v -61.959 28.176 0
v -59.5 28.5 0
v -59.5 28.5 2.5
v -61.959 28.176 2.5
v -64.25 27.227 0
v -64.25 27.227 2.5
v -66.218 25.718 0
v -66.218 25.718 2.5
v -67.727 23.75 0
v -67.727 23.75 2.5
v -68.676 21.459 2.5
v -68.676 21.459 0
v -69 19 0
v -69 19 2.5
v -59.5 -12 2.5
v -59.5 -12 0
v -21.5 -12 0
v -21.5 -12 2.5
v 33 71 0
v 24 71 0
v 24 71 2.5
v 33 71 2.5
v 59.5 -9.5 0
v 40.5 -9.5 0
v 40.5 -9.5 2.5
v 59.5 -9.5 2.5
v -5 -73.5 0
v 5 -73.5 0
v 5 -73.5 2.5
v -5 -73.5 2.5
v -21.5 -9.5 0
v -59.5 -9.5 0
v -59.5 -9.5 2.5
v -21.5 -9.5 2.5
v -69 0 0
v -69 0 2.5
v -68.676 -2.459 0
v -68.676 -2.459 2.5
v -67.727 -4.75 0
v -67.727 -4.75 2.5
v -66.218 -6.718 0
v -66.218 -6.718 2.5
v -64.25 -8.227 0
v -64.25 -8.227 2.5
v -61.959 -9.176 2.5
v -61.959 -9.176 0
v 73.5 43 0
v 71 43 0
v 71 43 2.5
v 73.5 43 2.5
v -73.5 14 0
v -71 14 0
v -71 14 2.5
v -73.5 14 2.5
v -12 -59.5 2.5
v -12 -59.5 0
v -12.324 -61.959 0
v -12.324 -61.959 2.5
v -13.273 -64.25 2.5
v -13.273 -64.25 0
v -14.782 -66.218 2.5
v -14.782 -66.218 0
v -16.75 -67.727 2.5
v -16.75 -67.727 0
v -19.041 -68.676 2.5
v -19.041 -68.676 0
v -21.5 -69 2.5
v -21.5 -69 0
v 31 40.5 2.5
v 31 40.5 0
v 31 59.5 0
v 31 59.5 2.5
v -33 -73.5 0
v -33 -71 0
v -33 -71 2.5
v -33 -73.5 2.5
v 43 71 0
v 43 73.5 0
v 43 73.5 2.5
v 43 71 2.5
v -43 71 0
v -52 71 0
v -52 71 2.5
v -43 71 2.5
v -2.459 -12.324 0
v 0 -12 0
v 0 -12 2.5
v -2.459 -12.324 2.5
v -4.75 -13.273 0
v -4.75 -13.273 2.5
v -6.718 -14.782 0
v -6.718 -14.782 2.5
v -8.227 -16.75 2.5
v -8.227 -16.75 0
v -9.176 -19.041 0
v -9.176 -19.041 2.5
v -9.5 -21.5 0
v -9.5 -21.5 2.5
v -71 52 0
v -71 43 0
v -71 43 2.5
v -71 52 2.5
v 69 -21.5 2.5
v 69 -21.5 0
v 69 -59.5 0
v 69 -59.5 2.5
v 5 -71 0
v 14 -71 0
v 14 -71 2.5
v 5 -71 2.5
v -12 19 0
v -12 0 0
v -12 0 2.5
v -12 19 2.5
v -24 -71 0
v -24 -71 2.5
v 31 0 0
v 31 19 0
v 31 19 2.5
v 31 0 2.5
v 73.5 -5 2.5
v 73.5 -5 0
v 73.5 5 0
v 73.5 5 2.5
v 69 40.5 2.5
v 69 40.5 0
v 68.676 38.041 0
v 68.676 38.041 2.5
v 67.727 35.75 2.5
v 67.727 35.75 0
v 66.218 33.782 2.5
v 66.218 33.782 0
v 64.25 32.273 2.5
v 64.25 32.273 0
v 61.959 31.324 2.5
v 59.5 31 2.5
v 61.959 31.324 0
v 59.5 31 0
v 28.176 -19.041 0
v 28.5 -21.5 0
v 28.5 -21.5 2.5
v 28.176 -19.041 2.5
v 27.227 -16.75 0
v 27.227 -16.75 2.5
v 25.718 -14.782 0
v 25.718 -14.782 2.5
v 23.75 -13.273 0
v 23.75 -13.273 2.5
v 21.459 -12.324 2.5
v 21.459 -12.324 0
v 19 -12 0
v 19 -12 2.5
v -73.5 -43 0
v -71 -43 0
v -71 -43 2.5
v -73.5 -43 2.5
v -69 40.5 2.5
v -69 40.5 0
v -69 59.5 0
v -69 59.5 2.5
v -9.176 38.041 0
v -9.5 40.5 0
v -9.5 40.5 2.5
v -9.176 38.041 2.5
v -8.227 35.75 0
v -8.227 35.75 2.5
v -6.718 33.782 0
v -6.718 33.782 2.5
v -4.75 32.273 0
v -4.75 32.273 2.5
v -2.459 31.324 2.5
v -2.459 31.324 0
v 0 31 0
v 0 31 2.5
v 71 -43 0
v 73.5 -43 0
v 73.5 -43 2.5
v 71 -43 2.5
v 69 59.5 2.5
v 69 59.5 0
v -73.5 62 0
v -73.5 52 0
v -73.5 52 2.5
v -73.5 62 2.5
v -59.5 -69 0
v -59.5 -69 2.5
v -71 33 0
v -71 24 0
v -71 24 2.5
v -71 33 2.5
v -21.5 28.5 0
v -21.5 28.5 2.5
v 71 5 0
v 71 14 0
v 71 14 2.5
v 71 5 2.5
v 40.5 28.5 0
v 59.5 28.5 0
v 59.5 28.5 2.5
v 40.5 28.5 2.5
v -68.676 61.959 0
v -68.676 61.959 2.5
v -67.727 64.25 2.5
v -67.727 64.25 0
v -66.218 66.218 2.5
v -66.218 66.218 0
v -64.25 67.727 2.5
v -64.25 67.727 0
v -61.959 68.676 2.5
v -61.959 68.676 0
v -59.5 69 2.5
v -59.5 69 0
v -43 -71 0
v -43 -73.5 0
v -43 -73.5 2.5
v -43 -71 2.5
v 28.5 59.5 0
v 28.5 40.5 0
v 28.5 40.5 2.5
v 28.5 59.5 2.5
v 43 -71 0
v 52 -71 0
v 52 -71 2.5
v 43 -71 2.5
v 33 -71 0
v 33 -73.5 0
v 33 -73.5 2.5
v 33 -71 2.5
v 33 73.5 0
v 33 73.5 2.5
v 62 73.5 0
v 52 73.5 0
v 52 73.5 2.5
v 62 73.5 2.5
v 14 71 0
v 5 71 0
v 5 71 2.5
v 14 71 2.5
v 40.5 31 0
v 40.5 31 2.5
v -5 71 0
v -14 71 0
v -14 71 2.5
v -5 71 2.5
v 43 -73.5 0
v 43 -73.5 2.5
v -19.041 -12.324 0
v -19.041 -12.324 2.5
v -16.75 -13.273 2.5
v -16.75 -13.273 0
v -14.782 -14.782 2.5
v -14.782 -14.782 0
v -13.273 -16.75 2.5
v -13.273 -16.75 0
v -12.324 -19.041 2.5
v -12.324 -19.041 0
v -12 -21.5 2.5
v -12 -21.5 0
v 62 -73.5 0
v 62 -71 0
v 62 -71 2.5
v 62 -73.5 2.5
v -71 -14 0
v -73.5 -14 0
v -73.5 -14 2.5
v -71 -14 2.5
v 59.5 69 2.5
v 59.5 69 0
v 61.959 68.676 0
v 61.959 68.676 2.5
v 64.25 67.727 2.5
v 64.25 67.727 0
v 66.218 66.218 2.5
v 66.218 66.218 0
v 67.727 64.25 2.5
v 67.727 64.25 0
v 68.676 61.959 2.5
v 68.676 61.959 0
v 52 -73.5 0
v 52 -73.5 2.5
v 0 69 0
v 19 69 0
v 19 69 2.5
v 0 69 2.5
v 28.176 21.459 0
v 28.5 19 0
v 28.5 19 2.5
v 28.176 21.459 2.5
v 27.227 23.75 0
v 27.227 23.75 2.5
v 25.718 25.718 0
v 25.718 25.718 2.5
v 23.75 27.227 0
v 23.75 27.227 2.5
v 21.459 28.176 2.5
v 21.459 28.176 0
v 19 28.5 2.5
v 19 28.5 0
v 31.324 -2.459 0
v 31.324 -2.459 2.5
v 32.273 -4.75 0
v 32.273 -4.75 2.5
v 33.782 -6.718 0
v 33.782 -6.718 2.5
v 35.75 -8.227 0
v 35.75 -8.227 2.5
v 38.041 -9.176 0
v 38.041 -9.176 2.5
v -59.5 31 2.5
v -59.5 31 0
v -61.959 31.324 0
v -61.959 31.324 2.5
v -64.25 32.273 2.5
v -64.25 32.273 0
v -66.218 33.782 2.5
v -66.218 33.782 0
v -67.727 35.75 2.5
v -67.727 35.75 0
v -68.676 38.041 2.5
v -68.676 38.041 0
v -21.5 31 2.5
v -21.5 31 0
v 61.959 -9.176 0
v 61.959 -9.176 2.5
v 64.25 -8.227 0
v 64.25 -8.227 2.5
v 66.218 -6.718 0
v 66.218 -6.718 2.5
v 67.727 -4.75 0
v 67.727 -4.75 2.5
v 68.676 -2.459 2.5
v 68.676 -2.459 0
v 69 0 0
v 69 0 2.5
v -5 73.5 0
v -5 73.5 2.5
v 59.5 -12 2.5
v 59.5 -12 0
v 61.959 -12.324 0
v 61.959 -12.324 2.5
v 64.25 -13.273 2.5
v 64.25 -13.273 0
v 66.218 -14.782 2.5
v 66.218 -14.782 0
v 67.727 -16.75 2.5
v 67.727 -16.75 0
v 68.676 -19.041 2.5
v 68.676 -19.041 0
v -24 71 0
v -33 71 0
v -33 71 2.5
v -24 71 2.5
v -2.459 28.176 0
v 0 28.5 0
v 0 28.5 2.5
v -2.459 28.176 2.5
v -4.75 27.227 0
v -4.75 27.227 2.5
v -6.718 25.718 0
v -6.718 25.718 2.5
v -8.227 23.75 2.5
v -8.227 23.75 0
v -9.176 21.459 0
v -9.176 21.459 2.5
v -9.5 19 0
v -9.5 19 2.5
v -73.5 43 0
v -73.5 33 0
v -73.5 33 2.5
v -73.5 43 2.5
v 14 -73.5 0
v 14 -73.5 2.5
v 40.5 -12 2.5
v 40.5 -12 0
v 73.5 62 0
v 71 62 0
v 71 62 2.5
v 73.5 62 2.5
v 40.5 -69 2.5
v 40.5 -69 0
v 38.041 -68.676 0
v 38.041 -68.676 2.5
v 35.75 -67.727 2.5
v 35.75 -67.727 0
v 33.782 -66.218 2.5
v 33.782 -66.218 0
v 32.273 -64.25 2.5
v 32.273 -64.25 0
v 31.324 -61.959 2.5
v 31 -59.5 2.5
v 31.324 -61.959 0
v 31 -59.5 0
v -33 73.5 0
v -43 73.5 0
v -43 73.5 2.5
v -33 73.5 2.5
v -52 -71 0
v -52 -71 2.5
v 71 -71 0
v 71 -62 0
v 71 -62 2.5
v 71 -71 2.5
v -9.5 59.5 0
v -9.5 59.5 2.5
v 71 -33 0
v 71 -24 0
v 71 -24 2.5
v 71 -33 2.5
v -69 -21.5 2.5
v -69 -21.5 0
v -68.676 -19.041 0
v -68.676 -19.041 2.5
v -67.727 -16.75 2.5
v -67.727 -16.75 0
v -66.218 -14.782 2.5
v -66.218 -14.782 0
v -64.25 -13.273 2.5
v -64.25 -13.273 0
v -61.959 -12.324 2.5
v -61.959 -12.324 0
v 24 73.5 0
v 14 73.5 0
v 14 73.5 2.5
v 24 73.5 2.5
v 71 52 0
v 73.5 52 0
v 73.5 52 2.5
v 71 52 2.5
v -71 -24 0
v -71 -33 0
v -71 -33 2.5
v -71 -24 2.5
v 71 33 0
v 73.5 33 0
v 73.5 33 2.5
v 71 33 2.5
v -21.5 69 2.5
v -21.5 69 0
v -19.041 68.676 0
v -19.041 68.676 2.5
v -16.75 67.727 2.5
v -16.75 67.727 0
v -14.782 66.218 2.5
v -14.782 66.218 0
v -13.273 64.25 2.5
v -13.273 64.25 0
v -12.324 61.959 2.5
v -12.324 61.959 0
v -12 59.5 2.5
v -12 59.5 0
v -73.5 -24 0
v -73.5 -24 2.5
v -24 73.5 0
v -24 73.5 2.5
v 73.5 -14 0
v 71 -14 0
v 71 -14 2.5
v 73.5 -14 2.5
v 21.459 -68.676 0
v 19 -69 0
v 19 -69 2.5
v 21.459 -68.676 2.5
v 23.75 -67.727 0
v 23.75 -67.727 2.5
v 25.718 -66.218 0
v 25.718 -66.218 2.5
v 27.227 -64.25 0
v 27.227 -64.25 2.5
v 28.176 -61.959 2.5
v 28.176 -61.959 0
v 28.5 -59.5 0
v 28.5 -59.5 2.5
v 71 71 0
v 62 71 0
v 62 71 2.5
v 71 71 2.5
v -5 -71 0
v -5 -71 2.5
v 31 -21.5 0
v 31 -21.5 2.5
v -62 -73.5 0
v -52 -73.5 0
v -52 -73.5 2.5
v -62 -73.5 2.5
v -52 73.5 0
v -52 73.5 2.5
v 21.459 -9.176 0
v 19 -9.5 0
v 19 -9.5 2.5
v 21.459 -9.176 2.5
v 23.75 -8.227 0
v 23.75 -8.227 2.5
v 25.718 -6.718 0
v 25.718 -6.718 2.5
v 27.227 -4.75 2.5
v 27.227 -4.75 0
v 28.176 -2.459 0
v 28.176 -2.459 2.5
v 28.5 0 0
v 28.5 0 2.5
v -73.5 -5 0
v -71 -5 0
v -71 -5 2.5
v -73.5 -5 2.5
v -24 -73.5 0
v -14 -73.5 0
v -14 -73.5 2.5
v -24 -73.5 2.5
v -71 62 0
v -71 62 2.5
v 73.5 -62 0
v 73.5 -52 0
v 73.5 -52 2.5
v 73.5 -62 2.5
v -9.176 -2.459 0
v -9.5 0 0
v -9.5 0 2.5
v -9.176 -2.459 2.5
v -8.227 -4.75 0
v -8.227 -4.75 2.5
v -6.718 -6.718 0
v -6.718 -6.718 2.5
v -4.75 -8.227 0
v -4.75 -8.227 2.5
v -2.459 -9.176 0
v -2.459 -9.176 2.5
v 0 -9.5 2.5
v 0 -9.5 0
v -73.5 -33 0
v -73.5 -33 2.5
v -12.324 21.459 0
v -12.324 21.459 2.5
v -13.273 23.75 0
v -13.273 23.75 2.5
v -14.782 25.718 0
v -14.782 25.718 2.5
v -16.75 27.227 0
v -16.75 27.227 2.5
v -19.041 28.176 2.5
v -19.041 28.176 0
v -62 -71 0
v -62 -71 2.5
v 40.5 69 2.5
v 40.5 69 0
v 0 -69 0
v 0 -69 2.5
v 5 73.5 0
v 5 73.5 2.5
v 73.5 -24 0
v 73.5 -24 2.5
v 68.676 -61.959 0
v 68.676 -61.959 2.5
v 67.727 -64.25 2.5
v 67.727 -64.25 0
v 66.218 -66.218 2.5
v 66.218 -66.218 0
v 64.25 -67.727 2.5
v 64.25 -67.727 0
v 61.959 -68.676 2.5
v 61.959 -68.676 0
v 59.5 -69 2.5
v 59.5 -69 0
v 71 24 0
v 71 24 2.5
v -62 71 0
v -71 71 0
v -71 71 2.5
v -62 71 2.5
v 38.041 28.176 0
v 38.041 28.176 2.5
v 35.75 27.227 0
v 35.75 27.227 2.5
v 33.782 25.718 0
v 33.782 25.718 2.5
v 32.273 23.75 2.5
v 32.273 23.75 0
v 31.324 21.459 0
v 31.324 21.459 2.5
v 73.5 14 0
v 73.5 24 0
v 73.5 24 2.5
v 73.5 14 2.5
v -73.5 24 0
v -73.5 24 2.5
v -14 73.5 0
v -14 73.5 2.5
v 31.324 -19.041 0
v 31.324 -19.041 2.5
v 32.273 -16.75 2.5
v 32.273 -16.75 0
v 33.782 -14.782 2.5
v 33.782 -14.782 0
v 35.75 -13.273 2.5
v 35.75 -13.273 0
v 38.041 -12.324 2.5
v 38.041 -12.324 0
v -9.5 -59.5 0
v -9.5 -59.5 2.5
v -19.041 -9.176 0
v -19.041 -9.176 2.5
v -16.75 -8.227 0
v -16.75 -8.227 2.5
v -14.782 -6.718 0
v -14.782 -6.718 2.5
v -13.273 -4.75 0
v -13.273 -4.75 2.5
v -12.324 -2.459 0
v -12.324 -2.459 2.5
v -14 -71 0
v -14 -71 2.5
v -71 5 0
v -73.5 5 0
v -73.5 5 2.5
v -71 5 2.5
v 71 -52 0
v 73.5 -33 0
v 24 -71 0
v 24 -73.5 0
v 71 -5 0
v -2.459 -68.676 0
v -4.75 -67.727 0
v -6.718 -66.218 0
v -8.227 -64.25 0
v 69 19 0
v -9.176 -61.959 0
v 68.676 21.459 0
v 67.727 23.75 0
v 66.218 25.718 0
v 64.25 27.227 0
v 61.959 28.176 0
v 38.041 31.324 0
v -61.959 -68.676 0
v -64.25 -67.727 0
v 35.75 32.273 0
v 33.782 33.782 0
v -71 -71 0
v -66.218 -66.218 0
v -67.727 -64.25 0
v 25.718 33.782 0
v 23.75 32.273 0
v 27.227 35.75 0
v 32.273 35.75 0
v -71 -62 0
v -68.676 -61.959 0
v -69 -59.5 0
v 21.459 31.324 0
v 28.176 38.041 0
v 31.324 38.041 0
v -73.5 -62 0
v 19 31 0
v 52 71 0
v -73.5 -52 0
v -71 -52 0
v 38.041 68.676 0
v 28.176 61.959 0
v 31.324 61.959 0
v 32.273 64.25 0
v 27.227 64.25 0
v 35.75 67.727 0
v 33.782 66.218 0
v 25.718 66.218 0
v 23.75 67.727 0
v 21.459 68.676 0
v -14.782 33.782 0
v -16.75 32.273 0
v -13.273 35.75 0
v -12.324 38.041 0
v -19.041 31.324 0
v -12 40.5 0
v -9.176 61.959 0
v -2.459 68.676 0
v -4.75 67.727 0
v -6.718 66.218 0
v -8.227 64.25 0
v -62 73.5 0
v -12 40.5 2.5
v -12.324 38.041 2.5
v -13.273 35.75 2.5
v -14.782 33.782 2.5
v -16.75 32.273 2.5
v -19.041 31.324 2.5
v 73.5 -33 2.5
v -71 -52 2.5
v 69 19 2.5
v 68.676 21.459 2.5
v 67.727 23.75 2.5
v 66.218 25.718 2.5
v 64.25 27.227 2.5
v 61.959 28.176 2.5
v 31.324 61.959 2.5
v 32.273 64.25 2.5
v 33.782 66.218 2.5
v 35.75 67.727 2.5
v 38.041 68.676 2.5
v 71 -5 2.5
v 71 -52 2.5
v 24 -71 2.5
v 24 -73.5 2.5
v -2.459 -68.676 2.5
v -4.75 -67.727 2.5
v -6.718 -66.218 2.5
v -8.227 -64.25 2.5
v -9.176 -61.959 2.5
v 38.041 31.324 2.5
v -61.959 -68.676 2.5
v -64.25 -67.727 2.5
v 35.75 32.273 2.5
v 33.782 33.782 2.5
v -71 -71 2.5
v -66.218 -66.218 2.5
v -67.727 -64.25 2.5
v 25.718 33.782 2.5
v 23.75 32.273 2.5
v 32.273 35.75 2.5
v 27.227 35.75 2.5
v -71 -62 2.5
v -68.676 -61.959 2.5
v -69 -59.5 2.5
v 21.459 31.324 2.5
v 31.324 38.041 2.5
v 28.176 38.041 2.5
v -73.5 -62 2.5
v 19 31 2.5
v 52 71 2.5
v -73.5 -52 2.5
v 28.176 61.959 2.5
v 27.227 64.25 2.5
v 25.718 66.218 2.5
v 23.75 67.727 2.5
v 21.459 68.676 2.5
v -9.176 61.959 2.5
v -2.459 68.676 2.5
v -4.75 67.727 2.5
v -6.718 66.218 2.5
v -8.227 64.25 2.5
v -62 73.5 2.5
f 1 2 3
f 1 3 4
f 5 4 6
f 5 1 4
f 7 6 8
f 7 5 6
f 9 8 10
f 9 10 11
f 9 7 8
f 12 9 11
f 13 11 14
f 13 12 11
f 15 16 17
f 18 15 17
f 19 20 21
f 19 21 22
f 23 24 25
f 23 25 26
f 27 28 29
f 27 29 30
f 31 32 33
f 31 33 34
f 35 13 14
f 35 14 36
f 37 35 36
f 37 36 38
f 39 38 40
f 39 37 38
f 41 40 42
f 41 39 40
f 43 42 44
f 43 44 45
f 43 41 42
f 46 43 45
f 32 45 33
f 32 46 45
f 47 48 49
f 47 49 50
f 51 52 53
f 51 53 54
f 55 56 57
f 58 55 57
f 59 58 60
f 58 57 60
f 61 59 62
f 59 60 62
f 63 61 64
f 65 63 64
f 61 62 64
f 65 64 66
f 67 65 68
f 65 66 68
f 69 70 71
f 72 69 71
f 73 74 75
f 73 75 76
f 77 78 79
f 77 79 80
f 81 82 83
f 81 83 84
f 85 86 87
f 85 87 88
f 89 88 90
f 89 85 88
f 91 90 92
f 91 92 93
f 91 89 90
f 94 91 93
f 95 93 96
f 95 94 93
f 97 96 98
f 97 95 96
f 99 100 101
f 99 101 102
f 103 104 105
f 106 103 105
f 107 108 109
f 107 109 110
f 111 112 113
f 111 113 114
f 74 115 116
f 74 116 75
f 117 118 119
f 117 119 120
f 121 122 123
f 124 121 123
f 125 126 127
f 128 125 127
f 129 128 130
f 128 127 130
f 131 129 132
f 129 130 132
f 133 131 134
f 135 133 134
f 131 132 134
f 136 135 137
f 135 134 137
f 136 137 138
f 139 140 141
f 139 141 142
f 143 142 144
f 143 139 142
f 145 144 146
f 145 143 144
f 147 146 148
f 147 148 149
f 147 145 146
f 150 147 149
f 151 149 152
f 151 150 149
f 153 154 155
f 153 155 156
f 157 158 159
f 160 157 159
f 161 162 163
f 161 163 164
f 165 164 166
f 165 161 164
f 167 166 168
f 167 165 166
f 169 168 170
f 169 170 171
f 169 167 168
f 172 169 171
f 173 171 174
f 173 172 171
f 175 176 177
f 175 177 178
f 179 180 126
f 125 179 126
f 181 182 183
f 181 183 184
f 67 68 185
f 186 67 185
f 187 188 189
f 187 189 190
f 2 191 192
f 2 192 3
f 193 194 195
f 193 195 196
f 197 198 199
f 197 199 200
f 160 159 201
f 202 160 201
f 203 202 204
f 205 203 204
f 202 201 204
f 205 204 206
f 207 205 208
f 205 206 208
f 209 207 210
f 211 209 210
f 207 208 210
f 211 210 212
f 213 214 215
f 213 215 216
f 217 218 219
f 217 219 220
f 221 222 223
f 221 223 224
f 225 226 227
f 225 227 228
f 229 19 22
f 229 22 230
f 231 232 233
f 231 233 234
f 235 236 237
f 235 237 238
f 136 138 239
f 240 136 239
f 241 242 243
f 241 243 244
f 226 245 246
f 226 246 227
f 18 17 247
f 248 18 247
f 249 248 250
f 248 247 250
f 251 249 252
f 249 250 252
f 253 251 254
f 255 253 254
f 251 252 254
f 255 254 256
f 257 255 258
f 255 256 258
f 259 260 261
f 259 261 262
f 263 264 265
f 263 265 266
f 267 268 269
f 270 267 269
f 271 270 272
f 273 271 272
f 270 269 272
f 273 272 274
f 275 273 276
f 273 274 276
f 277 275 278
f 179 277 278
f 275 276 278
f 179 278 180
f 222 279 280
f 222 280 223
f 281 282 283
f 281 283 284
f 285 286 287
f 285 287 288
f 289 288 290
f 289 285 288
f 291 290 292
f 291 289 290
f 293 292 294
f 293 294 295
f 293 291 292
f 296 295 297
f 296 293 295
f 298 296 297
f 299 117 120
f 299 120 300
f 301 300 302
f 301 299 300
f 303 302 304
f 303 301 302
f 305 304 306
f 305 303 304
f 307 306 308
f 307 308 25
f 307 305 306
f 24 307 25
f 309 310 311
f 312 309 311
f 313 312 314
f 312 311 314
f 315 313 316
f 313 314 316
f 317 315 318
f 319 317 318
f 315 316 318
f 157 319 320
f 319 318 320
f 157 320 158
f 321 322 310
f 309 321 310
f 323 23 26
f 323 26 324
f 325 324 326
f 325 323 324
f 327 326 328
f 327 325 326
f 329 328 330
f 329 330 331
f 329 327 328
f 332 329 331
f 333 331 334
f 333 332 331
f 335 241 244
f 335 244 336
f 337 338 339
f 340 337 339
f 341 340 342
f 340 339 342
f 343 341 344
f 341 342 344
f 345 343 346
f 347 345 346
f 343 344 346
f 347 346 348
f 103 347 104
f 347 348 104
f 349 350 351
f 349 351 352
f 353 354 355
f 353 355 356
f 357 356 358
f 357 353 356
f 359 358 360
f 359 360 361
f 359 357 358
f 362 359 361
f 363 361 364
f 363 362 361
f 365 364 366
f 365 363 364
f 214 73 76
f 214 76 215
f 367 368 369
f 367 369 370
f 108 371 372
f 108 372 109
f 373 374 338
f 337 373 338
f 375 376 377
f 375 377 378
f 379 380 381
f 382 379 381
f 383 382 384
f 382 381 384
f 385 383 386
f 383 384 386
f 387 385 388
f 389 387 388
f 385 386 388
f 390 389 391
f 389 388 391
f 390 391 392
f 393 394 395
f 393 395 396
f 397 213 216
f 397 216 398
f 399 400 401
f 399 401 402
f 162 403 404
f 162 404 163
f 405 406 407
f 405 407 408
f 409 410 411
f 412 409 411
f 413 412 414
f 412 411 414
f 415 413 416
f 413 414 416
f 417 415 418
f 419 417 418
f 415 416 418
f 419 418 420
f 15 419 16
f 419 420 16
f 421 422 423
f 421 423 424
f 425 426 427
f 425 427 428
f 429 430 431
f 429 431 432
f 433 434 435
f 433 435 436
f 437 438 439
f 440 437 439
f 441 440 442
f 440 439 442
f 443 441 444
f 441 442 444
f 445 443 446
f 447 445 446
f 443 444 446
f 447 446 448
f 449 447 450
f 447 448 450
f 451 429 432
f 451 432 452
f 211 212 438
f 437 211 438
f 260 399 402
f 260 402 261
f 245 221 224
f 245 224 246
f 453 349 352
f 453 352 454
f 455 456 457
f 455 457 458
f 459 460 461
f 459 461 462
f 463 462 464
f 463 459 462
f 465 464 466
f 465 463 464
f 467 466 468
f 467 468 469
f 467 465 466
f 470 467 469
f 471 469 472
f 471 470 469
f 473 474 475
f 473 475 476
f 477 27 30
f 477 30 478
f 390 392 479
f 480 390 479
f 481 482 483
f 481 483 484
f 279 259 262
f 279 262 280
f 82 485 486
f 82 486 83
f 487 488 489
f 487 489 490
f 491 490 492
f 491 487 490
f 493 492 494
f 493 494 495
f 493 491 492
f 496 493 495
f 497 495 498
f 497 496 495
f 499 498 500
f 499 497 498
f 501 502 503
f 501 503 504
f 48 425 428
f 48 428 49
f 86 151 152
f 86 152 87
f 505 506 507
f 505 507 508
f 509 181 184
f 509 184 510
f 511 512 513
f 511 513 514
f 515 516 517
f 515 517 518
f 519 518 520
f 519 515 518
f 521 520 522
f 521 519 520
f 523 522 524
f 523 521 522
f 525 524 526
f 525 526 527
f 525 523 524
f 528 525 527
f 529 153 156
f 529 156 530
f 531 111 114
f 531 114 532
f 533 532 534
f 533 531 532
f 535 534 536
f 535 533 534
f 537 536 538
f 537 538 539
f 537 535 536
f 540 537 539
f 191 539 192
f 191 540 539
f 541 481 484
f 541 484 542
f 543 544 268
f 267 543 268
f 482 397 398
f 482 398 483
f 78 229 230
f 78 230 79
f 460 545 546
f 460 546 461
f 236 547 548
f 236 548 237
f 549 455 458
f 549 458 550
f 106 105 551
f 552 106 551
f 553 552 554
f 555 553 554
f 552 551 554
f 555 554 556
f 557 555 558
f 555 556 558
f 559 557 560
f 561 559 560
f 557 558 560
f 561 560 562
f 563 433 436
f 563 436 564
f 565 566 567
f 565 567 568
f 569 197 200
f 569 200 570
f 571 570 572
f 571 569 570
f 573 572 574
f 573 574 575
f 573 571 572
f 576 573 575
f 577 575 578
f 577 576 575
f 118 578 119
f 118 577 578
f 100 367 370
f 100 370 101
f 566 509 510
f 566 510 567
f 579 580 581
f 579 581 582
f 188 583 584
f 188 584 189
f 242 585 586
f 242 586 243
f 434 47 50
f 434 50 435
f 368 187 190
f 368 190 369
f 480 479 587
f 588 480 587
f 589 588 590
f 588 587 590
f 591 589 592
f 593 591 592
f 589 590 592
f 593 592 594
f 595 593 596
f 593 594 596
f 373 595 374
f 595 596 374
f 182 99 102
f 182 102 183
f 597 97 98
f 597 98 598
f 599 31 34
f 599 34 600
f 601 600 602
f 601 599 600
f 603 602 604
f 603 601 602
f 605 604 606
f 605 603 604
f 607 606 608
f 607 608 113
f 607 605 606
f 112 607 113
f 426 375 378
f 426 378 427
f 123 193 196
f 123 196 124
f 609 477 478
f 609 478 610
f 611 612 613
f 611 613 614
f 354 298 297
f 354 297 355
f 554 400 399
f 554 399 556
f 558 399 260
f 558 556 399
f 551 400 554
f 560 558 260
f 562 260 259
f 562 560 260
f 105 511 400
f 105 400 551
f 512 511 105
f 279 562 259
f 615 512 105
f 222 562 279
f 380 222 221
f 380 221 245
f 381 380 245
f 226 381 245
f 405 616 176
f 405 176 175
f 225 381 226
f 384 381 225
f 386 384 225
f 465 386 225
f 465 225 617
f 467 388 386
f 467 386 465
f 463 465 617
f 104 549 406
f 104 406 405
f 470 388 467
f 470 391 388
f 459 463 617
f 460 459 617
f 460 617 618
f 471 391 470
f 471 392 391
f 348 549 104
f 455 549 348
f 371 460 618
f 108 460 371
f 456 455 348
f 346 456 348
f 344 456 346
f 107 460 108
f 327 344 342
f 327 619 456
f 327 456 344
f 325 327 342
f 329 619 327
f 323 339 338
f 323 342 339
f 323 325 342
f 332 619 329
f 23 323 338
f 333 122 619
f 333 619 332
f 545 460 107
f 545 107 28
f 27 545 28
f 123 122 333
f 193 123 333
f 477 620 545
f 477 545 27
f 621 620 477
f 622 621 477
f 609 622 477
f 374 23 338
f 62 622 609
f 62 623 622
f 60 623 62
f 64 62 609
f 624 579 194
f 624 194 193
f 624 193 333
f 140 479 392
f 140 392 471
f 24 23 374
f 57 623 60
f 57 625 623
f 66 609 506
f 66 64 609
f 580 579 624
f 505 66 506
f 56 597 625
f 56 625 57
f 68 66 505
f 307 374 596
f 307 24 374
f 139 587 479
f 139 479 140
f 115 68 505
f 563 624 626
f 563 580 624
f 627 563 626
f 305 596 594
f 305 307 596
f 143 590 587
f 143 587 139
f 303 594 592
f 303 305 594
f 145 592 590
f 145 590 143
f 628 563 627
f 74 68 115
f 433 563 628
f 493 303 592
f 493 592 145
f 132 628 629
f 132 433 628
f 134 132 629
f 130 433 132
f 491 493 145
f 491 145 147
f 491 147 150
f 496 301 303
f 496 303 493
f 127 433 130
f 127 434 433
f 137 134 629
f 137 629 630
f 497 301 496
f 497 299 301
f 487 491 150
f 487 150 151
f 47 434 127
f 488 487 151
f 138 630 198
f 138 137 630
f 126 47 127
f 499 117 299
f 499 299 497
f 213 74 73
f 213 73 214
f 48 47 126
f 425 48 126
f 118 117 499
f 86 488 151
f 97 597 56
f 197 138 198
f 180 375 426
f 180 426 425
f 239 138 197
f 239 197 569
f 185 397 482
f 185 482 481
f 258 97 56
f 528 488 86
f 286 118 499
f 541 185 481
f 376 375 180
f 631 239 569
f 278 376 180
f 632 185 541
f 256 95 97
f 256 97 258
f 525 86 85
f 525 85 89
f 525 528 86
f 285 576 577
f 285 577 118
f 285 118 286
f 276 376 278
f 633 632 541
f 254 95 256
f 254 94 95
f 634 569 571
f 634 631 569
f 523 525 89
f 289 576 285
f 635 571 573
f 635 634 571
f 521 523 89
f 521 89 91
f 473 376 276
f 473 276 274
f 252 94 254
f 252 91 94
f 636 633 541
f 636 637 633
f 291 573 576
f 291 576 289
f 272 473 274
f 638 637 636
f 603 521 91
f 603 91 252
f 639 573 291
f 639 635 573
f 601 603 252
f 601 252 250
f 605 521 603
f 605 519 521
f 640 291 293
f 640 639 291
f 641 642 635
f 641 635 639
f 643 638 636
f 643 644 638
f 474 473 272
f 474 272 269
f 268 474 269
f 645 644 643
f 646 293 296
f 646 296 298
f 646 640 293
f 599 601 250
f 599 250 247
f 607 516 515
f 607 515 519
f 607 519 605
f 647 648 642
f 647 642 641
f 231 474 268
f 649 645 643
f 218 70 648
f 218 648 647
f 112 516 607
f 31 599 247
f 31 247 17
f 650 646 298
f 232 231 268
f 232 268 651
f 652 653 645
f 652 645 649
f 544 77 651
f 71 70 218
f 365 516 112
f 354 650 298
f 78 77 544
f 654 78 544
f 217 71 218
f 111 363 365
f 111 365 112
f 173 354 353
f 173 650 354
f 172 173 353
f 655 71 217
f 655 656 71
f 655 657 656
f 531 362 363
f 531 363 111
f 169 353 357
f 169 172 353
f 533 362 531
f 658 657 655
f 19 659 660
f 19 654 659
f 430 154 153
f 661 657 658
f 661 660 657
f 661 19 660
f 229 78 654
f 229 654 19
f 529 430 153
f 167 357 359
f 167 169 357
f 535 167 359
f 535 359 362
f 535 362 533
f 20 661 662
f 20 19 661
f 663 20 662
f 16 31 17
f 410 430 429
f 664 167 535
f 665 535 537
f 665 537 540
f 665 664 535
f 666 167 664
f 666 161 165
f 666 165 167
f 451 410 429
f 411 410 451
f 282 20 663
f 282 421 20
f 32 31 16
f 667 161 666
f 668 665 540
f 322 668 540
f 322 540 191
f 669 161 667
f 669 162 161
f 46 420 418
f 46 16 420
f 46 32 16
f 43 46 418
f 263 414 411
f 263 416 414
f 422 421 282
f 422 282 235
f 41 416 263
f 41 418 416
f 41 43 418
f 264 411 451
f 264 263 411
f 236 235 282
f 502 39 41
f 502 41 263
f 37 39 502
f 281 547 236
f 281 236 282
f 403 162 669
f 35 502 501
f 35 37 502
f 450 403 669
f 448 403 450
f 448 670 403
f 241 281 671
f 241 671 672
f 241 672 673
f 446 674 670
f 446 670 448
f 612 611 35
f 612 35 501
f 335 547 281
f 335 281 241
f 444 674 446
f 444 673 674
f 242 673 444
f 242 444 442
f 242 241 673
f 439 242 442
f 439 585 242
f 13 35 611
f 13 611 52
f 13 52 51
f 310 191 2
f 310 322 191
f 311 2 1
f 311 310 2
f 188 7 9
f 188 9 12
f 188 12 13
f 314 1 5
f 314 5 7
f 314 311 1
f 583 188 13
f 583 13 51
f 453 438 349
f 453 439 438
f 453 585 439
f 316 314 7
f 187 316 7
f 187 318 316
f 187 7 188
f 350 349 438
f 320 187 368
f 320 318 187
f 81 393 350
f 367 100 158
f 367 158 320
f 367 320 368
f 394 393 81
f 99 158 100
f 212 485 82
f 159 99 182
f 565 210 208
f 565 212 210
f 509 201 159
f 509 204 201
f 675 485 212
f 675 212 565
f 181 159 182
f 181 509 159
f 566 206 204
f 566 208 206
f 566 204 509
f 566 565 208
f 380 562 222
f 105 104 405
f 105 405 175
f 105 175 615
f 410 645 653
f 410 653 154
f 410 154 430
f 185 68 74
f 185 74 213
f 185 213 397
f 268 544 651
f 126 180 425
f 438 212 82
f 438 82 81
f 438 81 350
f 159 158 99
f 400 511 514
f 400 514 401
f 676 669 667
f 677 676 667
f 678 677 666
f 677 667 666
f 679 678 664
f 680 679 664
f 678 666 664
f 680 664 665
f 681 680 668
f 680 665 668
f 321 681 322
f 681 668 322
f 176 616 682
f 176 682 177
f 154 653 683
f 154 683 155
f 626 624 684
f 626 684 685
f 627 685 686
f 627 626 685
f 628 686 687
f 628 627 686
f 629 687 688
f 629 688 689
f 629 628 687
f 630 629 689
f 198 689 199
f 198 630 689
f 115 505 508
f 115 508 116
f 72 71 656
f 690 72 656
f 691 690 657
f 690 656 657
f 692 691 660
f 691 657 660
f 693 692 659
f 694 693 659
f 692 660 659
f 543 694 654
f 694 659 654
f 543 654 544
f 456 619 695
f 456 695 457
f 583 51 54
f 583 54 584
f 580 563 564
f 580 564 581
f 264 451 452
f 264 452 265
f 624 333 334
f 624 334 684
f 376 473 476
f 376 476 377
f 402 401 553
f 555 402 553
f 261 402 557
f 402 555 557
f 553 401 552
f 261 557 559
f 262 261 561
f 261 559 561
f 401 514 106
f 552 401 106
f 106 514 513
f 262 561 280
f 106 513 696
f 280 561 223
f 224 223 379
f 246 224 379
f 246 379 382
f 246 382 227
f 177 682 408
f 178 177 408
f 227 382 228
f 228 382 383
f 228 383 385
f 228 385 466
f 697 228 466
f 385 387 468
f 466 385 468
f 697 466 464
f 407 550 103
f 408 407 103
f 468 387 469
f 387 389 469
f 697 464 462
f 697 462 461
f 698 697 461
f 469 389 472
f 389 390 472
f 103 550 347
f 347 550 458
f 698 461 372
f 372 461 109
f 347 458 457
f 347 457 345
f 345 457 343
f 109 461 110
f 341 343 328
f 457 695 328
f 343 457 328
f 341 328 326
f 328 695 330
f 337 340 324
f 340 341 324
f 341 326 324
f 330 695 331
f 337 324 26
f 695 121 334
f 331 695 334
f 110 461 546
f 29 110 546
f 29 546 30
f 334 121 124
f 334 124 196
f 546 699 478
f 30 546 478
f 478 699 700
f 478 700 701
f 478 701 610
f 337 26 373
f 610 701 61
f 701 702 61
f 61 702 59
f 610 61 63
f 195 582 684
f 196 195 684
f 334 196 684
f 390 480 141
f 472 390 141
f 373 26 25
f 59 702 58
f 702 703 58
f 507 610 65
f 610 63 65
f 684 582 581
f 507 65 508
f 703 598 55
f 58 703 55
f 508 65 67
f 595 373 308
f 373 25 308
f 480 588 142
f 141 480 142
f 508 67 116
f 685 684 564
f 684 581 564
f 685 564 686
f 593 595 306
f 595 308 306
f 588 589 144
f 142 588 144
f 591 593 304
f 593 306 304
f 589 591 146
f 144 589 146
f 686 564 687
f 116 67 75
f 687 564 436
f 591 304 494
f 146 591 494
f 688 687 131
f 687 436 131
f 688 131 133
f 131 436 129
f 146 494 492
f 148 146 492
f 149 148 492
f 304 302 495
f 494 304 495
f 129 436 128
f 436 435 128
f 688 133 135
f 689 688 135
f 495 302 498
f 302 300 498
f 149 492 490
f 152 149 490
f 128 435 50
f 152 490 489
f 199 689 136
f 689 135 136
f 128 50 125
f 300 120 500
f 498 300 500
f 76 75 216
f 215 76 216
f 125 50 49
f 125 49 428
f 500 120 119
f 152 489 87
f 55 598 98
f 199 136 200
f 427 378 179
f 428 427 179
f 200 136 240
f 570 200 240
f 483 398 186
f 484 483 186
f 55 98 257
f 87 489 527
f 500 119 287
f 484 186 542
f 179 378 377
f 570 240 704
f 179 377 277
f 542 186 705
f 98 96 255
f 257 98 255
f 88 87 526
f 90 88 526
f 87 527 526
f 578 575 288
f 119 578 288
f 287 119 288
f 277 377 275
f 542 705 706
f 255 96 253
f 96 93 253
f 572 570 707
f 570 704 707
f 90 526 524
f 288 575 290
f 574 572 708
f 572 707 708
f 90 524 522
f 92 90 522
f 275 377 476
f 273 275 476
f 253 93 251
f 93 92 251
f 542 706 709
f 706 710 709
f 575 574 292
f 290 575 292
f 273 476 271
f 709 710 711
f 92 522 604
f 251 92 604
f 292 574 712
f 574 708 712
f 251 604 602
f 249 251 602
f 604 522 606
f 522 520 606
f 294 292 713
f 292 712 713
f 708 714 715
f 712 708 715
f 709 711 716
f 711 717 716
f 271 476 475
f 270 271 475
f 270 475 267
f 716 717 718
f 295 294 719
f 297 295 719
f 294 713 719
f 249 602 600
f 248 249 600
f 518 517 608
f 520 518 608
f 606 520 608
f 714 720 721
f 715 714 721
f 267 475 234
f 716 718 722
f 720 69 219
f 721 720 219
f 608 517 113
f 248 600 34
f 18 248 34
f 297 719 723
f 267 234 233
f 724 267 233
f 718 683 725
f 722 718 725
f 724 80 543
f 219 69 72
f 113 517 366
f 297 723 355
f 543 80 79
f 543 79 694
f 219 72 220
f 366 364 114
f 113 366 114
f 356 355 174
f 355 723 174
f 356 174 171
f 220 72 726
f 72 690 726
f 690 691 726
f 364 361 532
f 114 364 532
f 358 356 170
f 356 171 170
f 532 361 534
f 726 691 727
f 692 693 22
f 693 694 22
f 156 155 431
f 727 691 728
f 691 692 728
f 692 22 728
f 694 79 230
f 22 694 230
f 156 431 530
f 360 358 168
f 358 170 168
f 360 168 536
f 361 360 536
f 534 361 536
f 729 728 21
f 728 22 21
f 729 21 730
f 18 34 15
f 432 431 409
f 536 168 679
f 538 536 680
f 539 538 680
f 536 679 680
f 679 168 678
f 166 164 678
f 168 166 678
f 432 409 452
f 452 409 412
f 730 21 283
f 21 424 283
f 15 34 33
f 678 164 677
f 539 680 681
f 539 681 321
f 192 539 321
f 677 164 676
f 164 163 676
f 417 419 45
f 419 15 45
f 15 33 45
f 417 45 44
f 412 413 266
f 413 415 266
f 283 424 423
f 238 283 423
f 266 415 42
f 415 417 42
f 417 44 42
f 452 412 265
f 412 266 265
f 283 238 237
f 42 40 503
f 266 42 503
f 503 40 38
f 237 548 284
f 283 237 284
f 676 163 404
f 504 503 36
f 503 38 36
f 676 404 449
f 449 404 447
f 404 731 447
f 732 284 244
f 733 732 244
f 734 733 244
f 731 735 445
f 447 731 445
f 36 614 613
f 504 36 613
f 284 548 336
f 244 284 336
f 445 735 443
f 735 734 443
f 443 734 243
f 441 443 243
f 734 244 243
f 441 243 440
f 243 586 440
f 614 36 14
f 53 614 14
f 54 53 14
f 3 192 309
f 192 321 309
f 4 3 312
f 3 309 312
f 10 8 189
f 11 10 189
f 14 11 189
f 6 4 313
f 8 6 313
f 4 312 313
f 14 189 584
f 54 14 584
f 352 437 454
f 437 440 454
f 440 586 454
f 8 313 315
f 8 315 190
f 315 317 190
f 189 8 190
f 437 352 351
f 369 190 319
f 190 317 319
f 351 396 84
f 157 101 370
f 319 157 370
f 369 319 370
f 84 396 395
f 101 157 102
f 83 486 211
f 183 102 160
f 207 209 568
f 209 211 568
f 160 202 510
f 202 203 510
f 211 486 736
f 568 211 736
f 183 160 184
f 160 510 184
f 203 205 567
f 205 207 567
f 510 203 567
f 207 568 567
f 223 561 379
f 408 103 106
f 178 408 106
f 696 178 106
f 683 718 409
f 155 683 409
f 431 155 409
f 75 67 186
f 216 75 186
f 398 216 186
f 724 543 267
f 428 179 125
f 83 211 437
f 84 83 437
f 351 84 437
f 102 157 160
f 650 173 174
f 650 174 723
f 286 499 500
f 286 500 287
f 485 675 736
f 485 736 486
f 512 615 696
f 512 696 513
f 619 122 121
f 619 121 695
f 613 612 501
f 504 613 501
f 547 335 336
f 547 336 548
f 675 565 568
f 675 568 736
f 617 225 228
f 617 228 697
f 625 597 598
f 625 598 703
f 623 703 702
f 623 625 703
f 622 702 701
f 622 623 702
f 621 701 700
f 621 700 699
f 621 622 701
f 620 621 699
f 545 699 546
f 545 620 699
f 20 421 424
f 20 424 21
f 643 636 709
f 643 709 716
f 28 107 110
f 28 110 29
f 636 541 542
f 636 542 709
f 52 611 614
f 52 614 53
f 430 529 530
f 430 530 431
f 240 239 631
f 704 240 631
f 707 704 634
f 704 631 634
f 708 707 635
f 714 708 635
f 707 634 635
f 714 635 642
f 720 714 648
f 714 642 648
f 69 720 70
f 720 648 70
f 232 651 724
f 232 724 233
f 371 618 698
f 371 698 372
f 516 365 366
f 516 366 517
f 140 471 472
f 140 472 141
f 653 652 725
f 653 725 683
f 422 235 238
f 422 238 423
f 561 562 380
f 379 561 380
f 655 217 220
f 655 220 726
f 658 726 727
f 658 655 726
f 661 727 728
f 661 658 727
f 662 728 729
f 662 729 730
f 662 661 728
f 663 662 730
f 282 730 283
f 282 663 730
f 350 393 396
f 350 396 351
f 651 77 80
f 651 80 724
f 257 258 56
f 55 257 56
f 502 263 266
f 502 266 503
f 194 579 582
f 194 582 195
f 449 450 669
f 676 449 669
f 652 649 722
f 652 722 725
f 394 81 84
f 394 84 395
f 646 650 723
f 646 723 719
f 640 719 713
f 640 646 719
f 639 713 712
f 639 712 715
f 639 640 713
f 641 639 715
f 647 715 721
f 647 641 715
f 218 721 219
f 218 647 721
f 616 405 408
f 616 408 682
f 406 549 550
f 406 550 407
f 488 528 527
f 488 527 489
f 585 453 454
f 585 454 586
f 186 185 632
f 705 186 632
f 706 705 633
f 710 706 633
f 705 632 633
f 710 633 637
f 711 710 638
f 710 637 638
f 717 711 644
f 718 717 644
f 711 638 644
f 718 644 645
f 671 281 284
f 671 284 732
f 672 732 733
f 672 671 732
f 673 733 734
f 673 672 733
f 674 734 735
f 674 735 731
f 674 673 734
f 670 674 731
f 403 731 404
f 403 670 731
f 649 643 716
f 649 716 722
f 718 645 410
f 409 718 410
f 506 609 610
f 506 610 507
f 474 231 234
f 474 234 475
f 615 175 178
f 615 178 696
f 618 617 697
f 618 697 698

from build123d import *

# Parameters (mm, degrees)
BOSS_EXTRUDE1_DEPTH = 2.5


with BuildPart() as part:
    # Sketch1 → Boss-Extrude1 (new body)
    with BuildSketch(Plane.XY):
        Polygon((-73.5, 0), (-73.5, 5), (-71, 5), (-71, 14), (-73.5, 14), (-73.5, 24), (-71, 24), (-71, 33), (-73.5, 33), (-73.5, 43), (-71, 43), (-71, 52), (-73.5, 52), (-73.5, 62), (-71, 62), (-71, 71), (-62, 71), (-62, 73.5), (-52, 73.5), (-52, 71), (-43, 71), (-43, 73.5), (-33, 73.5), (-33, 71), (-24, 71), (-24, 73.5), (-14, 73.5), (-14, 71), (-5, 71), (-5, 73.5), (5, 73.5), (5, 71), (14, 71), (14, 73.5), (24, 73.5), (24, 71), (33, 71), (33, 73.5), (43, 73.5), (43, 71), (52, 71), (52, 73.5), (62, 73.5), (62, 71), (71, 71), (71, 62), (73.5, 62), (73.5, 52), (71, 52), (71, 43), (73.5, 43), (73.5, 33), (71, 33), (71, 24), (73.5, 24), (73.5, 14), (71, 14), (71, 5), (73.5, 5), (73.5, 0), (73.5, -5), (71, -5), (71, -14), (73.5, -14), (73.5, -24), (71, -24), (71, -33), (73.5, -33), (73.5, -43), (71, -43), (71, -52), (73.5, -52), (73.5, -62), (71, -62), (71, -71), (62, -71), (62, -73.5), (52, -73.5), (52, -71), (43, -71), (43, -73.5), (33, -73.5), (33, -71), (24, -71), (24, -73.5), (14, -73.5), (14, -71), (5, -71), (5, -73.5), (-5, -73.5), (-5, -71), (-14, -71), (-14, -73.5), (-24, -73.5), (-24, -71), (-33, -71), (-33, -73.5), (-43, -73.5), (-43, -71), (-52, -71), (-52, -73.5), (-62, -73.5), (-62, -71), (-71, -71), (-71, -62), (-73.5, -62), (-73.5, -52), (-71, -52), (-71, -43), (-73.5, -43), (-73.5, -33), (-71, -33), (-71, -24), (-73.5, -24), (-73.5, -14), (-71, -14), (-71, -5), (-73.5, -5), align=None)
        with BuildLine():
            Line((-9.5, 59.5), (-9.5, 40.5))
            ThreePointArc((-9.5, 40.5), (-6.717514421, 33.782485579), (0, 31))
            Line((0, 31), (19, 31))
            ThreePointArc((19, 31), (25.717514421, 33.782485579), (28.5, 40.5))
            Line((28.5, 40.5), (28.5, 59.5))
            ThreePointArc((28.5, 59.5), (25.717514421, 66.217514421), (19, 69))
            Line((19, 69), (0, 69))
            ThreePointArc((0, 69), (-6.717514421, 66.217514421), (-9.5, 59.5))
        make_face(mode=Mode.SUBTRACT)
        with BuildLine():
            Line((40.5, 69), (59.5, 69))
            ThreePointArc((59.5, 69), (66.217514421, 66.217514421), (69, 59.5))
            Line((69, 59.5), (69, 40.5))
            ThreePointArc((69, 40.5), (66.217514421, 33.782485579), (59.5, 31))
            Line((59.5, 31), (40.5, 31))
            ThreePointArc((40.5, 31), (33.782485579, 33.782485579), (31, 40.5))
            Line((31, 40.5), (31, 59.5))
            ThreePointArc((31, 59.5), (33.782485579, 66.217514421), (40.5, 69))
        make_face(mode=Mode.SUBTRACT)
        with BuildLine():
            Line((-9.5, 19), (-9.5, 0))
            ThreePointArc((-9.5, 0), (-6.717514421, -6.717514421), (0, -9.5))
            Line((0, -9.5), (19, -9.5))
            ThreePointArc((19, -9.5), (25.717514421, -6.717514421), (28.5, 0))
            Line((28.5, 0), (28.5, 19))
            ThreePointArc((28.5, 19), (25.717514421, 25.717514421), (19, 28.5))
            Line((19, 28.5), (0, 28.5))
            ThreePointArc((0, 28.5), (-6.717514421, 25.717514421), (-9.5, 19))
        make_face(mode=Mode.SUBTRACT)
        with BuildLine():
            Line((31, 19), (31, 0))
            ThreePointArc((31, 0), (33.782485579, -6.717514421), (40.5, -9.5))
            Line((40.5, -9.5), (59.5, -9.5))
            ThreePointArc((59.5, -9.5), (66.217514421, -6.717514421), (69, 0))
            Line((69, 0), (69, 19))
            ThreePointArc((69, 19), (66.217514421, 25.717514421), (59.5, 28.5))
            Line((59.5, 28.5), (40.5, 28.5))
            ThreePointArc((40.5, 28.5), (33.782485579, 25.717514421), (31, 19))
        make_face(mode=Mode.SUBTRACT)
        with BuildLine():
            Line((-69, 19), (-69, 0))
            ThreePointArc((-69, 0), (-66.217514421, -6.717514421), (-59.5, -9.5))
            Line((-59.5, -9.5), (-21.5, -9.5))
            ThreePointArc((-21.5, -9.5), (-14.782485579, -6.717514421), (-12, 0))
            Line((-12, 0), (-12, 19))
            ThreePointArc((-12, 19), (-14.782485579, 25.717514421), (-21.5, 28.5))
            Line((-21.5, 28.5), (-59.5, 28.5))
            ThreePointArc((-59.5, 28.5), (-66.217514421, 25.717514421), (-69, 19))
        make_face(mode=Mode.SUBTRACT)
        with BuildLine():
            Line((-59.5, 69), (-21.5, 69))
            ThreePointArc((-21.5, 69), (-14.782485579, 66.217514421), (-12, 59.5))
            Line((-12, 59.5), (-12, 40.5))
            ThreePointArc((-12, 40.5), (-14.782485579, 33.782485579), (-21.5, 31))
            Line((-21.5, 31), (-59.5, 31))
            ThreePointArc((-59.5, 31), (-66.217514421, 33.782485579), (-69, 40.5))
            Line((-69, 40.5), (-69, 59.5))
            ThreePointArc((-69, 59.5), (-66.217514421, 66.217514421), (-59.5, 69))
        make_face(mode=Mode.SUBTRACT)
        with BuildLine():
            Line((-9.5, -21.5), (-9.5, -59.5))
            ThreePointArc((-9.5, -59.5), (-6.717514421, -66.217514421), (0, -69))
            Line((0, -69), (19, -69))
            ThreePointArc((19, -69), (25.717514421, -66.217514421), (28.5, -59.5))
            Line((28.5, -59.5), (28.5, -21.5))
            ThreePointArc((28.5, -21.5), (25.717514421, -14.782485579), (19, -12))
            Line((19, -12), (0, -12))
            ThreePointArc((0, -12), (-6.717514421, -14.782485579), (-9.5, -21.5))
        make_face(mode=Mode.SUBTRACT)
        with BuildLine():
            Line((40.5, -12), (59.5, -12))
            ThreePointArc((59.5, -12), (66.217514421, -14.782485579), (69, -21.5))
            Line((69, -21.5), (69, -59.5))
            ThreePointArc((69, -59.5), (66.217514421, -66.217514421), (59.5, -69))
            Line((59.5, -69), (40.5, -69))
            ThreePointArc((40.5, -69), (33.782485579, -66.217514421), (31, -59.5))
            Line((31, -59.5), (31, -21.5))
            ThreePointArc((31, -21.5), (33.782485579, -14.782485579), (40.5, -12))
        make_face(mode=Mode.SUBTRACT)
        with BuildLine():
            Line((-59.5, -12), (-21.5, -12))
            ThreePointArc((-21.5, -12), (-14.782485579, -14.782485579), (-12, -21.5))
            Line((-12, -21.5), (-12, -59.5))
            ThreePointArc((-12, -59.5), (-14.782485579, -66.217514421), (-21.5, -69))
            Line((-21.5, -69), (-59.5, -69))
            ThreePointArc((-59.5, -69), (-66.217514421, -66.217514421), (-69, -59.5))
            Line((-69, -59.5), (-69, -21.5))
            ThreePointArc((-69, -21.5), (-66.217514421, -14.782485579), (-59.5, -12))
        make_face(mode=Mode.SUBTRACT)
    extrude(amount=BOSS_EXTRUDE1_DEPTH)


solid = part.part
